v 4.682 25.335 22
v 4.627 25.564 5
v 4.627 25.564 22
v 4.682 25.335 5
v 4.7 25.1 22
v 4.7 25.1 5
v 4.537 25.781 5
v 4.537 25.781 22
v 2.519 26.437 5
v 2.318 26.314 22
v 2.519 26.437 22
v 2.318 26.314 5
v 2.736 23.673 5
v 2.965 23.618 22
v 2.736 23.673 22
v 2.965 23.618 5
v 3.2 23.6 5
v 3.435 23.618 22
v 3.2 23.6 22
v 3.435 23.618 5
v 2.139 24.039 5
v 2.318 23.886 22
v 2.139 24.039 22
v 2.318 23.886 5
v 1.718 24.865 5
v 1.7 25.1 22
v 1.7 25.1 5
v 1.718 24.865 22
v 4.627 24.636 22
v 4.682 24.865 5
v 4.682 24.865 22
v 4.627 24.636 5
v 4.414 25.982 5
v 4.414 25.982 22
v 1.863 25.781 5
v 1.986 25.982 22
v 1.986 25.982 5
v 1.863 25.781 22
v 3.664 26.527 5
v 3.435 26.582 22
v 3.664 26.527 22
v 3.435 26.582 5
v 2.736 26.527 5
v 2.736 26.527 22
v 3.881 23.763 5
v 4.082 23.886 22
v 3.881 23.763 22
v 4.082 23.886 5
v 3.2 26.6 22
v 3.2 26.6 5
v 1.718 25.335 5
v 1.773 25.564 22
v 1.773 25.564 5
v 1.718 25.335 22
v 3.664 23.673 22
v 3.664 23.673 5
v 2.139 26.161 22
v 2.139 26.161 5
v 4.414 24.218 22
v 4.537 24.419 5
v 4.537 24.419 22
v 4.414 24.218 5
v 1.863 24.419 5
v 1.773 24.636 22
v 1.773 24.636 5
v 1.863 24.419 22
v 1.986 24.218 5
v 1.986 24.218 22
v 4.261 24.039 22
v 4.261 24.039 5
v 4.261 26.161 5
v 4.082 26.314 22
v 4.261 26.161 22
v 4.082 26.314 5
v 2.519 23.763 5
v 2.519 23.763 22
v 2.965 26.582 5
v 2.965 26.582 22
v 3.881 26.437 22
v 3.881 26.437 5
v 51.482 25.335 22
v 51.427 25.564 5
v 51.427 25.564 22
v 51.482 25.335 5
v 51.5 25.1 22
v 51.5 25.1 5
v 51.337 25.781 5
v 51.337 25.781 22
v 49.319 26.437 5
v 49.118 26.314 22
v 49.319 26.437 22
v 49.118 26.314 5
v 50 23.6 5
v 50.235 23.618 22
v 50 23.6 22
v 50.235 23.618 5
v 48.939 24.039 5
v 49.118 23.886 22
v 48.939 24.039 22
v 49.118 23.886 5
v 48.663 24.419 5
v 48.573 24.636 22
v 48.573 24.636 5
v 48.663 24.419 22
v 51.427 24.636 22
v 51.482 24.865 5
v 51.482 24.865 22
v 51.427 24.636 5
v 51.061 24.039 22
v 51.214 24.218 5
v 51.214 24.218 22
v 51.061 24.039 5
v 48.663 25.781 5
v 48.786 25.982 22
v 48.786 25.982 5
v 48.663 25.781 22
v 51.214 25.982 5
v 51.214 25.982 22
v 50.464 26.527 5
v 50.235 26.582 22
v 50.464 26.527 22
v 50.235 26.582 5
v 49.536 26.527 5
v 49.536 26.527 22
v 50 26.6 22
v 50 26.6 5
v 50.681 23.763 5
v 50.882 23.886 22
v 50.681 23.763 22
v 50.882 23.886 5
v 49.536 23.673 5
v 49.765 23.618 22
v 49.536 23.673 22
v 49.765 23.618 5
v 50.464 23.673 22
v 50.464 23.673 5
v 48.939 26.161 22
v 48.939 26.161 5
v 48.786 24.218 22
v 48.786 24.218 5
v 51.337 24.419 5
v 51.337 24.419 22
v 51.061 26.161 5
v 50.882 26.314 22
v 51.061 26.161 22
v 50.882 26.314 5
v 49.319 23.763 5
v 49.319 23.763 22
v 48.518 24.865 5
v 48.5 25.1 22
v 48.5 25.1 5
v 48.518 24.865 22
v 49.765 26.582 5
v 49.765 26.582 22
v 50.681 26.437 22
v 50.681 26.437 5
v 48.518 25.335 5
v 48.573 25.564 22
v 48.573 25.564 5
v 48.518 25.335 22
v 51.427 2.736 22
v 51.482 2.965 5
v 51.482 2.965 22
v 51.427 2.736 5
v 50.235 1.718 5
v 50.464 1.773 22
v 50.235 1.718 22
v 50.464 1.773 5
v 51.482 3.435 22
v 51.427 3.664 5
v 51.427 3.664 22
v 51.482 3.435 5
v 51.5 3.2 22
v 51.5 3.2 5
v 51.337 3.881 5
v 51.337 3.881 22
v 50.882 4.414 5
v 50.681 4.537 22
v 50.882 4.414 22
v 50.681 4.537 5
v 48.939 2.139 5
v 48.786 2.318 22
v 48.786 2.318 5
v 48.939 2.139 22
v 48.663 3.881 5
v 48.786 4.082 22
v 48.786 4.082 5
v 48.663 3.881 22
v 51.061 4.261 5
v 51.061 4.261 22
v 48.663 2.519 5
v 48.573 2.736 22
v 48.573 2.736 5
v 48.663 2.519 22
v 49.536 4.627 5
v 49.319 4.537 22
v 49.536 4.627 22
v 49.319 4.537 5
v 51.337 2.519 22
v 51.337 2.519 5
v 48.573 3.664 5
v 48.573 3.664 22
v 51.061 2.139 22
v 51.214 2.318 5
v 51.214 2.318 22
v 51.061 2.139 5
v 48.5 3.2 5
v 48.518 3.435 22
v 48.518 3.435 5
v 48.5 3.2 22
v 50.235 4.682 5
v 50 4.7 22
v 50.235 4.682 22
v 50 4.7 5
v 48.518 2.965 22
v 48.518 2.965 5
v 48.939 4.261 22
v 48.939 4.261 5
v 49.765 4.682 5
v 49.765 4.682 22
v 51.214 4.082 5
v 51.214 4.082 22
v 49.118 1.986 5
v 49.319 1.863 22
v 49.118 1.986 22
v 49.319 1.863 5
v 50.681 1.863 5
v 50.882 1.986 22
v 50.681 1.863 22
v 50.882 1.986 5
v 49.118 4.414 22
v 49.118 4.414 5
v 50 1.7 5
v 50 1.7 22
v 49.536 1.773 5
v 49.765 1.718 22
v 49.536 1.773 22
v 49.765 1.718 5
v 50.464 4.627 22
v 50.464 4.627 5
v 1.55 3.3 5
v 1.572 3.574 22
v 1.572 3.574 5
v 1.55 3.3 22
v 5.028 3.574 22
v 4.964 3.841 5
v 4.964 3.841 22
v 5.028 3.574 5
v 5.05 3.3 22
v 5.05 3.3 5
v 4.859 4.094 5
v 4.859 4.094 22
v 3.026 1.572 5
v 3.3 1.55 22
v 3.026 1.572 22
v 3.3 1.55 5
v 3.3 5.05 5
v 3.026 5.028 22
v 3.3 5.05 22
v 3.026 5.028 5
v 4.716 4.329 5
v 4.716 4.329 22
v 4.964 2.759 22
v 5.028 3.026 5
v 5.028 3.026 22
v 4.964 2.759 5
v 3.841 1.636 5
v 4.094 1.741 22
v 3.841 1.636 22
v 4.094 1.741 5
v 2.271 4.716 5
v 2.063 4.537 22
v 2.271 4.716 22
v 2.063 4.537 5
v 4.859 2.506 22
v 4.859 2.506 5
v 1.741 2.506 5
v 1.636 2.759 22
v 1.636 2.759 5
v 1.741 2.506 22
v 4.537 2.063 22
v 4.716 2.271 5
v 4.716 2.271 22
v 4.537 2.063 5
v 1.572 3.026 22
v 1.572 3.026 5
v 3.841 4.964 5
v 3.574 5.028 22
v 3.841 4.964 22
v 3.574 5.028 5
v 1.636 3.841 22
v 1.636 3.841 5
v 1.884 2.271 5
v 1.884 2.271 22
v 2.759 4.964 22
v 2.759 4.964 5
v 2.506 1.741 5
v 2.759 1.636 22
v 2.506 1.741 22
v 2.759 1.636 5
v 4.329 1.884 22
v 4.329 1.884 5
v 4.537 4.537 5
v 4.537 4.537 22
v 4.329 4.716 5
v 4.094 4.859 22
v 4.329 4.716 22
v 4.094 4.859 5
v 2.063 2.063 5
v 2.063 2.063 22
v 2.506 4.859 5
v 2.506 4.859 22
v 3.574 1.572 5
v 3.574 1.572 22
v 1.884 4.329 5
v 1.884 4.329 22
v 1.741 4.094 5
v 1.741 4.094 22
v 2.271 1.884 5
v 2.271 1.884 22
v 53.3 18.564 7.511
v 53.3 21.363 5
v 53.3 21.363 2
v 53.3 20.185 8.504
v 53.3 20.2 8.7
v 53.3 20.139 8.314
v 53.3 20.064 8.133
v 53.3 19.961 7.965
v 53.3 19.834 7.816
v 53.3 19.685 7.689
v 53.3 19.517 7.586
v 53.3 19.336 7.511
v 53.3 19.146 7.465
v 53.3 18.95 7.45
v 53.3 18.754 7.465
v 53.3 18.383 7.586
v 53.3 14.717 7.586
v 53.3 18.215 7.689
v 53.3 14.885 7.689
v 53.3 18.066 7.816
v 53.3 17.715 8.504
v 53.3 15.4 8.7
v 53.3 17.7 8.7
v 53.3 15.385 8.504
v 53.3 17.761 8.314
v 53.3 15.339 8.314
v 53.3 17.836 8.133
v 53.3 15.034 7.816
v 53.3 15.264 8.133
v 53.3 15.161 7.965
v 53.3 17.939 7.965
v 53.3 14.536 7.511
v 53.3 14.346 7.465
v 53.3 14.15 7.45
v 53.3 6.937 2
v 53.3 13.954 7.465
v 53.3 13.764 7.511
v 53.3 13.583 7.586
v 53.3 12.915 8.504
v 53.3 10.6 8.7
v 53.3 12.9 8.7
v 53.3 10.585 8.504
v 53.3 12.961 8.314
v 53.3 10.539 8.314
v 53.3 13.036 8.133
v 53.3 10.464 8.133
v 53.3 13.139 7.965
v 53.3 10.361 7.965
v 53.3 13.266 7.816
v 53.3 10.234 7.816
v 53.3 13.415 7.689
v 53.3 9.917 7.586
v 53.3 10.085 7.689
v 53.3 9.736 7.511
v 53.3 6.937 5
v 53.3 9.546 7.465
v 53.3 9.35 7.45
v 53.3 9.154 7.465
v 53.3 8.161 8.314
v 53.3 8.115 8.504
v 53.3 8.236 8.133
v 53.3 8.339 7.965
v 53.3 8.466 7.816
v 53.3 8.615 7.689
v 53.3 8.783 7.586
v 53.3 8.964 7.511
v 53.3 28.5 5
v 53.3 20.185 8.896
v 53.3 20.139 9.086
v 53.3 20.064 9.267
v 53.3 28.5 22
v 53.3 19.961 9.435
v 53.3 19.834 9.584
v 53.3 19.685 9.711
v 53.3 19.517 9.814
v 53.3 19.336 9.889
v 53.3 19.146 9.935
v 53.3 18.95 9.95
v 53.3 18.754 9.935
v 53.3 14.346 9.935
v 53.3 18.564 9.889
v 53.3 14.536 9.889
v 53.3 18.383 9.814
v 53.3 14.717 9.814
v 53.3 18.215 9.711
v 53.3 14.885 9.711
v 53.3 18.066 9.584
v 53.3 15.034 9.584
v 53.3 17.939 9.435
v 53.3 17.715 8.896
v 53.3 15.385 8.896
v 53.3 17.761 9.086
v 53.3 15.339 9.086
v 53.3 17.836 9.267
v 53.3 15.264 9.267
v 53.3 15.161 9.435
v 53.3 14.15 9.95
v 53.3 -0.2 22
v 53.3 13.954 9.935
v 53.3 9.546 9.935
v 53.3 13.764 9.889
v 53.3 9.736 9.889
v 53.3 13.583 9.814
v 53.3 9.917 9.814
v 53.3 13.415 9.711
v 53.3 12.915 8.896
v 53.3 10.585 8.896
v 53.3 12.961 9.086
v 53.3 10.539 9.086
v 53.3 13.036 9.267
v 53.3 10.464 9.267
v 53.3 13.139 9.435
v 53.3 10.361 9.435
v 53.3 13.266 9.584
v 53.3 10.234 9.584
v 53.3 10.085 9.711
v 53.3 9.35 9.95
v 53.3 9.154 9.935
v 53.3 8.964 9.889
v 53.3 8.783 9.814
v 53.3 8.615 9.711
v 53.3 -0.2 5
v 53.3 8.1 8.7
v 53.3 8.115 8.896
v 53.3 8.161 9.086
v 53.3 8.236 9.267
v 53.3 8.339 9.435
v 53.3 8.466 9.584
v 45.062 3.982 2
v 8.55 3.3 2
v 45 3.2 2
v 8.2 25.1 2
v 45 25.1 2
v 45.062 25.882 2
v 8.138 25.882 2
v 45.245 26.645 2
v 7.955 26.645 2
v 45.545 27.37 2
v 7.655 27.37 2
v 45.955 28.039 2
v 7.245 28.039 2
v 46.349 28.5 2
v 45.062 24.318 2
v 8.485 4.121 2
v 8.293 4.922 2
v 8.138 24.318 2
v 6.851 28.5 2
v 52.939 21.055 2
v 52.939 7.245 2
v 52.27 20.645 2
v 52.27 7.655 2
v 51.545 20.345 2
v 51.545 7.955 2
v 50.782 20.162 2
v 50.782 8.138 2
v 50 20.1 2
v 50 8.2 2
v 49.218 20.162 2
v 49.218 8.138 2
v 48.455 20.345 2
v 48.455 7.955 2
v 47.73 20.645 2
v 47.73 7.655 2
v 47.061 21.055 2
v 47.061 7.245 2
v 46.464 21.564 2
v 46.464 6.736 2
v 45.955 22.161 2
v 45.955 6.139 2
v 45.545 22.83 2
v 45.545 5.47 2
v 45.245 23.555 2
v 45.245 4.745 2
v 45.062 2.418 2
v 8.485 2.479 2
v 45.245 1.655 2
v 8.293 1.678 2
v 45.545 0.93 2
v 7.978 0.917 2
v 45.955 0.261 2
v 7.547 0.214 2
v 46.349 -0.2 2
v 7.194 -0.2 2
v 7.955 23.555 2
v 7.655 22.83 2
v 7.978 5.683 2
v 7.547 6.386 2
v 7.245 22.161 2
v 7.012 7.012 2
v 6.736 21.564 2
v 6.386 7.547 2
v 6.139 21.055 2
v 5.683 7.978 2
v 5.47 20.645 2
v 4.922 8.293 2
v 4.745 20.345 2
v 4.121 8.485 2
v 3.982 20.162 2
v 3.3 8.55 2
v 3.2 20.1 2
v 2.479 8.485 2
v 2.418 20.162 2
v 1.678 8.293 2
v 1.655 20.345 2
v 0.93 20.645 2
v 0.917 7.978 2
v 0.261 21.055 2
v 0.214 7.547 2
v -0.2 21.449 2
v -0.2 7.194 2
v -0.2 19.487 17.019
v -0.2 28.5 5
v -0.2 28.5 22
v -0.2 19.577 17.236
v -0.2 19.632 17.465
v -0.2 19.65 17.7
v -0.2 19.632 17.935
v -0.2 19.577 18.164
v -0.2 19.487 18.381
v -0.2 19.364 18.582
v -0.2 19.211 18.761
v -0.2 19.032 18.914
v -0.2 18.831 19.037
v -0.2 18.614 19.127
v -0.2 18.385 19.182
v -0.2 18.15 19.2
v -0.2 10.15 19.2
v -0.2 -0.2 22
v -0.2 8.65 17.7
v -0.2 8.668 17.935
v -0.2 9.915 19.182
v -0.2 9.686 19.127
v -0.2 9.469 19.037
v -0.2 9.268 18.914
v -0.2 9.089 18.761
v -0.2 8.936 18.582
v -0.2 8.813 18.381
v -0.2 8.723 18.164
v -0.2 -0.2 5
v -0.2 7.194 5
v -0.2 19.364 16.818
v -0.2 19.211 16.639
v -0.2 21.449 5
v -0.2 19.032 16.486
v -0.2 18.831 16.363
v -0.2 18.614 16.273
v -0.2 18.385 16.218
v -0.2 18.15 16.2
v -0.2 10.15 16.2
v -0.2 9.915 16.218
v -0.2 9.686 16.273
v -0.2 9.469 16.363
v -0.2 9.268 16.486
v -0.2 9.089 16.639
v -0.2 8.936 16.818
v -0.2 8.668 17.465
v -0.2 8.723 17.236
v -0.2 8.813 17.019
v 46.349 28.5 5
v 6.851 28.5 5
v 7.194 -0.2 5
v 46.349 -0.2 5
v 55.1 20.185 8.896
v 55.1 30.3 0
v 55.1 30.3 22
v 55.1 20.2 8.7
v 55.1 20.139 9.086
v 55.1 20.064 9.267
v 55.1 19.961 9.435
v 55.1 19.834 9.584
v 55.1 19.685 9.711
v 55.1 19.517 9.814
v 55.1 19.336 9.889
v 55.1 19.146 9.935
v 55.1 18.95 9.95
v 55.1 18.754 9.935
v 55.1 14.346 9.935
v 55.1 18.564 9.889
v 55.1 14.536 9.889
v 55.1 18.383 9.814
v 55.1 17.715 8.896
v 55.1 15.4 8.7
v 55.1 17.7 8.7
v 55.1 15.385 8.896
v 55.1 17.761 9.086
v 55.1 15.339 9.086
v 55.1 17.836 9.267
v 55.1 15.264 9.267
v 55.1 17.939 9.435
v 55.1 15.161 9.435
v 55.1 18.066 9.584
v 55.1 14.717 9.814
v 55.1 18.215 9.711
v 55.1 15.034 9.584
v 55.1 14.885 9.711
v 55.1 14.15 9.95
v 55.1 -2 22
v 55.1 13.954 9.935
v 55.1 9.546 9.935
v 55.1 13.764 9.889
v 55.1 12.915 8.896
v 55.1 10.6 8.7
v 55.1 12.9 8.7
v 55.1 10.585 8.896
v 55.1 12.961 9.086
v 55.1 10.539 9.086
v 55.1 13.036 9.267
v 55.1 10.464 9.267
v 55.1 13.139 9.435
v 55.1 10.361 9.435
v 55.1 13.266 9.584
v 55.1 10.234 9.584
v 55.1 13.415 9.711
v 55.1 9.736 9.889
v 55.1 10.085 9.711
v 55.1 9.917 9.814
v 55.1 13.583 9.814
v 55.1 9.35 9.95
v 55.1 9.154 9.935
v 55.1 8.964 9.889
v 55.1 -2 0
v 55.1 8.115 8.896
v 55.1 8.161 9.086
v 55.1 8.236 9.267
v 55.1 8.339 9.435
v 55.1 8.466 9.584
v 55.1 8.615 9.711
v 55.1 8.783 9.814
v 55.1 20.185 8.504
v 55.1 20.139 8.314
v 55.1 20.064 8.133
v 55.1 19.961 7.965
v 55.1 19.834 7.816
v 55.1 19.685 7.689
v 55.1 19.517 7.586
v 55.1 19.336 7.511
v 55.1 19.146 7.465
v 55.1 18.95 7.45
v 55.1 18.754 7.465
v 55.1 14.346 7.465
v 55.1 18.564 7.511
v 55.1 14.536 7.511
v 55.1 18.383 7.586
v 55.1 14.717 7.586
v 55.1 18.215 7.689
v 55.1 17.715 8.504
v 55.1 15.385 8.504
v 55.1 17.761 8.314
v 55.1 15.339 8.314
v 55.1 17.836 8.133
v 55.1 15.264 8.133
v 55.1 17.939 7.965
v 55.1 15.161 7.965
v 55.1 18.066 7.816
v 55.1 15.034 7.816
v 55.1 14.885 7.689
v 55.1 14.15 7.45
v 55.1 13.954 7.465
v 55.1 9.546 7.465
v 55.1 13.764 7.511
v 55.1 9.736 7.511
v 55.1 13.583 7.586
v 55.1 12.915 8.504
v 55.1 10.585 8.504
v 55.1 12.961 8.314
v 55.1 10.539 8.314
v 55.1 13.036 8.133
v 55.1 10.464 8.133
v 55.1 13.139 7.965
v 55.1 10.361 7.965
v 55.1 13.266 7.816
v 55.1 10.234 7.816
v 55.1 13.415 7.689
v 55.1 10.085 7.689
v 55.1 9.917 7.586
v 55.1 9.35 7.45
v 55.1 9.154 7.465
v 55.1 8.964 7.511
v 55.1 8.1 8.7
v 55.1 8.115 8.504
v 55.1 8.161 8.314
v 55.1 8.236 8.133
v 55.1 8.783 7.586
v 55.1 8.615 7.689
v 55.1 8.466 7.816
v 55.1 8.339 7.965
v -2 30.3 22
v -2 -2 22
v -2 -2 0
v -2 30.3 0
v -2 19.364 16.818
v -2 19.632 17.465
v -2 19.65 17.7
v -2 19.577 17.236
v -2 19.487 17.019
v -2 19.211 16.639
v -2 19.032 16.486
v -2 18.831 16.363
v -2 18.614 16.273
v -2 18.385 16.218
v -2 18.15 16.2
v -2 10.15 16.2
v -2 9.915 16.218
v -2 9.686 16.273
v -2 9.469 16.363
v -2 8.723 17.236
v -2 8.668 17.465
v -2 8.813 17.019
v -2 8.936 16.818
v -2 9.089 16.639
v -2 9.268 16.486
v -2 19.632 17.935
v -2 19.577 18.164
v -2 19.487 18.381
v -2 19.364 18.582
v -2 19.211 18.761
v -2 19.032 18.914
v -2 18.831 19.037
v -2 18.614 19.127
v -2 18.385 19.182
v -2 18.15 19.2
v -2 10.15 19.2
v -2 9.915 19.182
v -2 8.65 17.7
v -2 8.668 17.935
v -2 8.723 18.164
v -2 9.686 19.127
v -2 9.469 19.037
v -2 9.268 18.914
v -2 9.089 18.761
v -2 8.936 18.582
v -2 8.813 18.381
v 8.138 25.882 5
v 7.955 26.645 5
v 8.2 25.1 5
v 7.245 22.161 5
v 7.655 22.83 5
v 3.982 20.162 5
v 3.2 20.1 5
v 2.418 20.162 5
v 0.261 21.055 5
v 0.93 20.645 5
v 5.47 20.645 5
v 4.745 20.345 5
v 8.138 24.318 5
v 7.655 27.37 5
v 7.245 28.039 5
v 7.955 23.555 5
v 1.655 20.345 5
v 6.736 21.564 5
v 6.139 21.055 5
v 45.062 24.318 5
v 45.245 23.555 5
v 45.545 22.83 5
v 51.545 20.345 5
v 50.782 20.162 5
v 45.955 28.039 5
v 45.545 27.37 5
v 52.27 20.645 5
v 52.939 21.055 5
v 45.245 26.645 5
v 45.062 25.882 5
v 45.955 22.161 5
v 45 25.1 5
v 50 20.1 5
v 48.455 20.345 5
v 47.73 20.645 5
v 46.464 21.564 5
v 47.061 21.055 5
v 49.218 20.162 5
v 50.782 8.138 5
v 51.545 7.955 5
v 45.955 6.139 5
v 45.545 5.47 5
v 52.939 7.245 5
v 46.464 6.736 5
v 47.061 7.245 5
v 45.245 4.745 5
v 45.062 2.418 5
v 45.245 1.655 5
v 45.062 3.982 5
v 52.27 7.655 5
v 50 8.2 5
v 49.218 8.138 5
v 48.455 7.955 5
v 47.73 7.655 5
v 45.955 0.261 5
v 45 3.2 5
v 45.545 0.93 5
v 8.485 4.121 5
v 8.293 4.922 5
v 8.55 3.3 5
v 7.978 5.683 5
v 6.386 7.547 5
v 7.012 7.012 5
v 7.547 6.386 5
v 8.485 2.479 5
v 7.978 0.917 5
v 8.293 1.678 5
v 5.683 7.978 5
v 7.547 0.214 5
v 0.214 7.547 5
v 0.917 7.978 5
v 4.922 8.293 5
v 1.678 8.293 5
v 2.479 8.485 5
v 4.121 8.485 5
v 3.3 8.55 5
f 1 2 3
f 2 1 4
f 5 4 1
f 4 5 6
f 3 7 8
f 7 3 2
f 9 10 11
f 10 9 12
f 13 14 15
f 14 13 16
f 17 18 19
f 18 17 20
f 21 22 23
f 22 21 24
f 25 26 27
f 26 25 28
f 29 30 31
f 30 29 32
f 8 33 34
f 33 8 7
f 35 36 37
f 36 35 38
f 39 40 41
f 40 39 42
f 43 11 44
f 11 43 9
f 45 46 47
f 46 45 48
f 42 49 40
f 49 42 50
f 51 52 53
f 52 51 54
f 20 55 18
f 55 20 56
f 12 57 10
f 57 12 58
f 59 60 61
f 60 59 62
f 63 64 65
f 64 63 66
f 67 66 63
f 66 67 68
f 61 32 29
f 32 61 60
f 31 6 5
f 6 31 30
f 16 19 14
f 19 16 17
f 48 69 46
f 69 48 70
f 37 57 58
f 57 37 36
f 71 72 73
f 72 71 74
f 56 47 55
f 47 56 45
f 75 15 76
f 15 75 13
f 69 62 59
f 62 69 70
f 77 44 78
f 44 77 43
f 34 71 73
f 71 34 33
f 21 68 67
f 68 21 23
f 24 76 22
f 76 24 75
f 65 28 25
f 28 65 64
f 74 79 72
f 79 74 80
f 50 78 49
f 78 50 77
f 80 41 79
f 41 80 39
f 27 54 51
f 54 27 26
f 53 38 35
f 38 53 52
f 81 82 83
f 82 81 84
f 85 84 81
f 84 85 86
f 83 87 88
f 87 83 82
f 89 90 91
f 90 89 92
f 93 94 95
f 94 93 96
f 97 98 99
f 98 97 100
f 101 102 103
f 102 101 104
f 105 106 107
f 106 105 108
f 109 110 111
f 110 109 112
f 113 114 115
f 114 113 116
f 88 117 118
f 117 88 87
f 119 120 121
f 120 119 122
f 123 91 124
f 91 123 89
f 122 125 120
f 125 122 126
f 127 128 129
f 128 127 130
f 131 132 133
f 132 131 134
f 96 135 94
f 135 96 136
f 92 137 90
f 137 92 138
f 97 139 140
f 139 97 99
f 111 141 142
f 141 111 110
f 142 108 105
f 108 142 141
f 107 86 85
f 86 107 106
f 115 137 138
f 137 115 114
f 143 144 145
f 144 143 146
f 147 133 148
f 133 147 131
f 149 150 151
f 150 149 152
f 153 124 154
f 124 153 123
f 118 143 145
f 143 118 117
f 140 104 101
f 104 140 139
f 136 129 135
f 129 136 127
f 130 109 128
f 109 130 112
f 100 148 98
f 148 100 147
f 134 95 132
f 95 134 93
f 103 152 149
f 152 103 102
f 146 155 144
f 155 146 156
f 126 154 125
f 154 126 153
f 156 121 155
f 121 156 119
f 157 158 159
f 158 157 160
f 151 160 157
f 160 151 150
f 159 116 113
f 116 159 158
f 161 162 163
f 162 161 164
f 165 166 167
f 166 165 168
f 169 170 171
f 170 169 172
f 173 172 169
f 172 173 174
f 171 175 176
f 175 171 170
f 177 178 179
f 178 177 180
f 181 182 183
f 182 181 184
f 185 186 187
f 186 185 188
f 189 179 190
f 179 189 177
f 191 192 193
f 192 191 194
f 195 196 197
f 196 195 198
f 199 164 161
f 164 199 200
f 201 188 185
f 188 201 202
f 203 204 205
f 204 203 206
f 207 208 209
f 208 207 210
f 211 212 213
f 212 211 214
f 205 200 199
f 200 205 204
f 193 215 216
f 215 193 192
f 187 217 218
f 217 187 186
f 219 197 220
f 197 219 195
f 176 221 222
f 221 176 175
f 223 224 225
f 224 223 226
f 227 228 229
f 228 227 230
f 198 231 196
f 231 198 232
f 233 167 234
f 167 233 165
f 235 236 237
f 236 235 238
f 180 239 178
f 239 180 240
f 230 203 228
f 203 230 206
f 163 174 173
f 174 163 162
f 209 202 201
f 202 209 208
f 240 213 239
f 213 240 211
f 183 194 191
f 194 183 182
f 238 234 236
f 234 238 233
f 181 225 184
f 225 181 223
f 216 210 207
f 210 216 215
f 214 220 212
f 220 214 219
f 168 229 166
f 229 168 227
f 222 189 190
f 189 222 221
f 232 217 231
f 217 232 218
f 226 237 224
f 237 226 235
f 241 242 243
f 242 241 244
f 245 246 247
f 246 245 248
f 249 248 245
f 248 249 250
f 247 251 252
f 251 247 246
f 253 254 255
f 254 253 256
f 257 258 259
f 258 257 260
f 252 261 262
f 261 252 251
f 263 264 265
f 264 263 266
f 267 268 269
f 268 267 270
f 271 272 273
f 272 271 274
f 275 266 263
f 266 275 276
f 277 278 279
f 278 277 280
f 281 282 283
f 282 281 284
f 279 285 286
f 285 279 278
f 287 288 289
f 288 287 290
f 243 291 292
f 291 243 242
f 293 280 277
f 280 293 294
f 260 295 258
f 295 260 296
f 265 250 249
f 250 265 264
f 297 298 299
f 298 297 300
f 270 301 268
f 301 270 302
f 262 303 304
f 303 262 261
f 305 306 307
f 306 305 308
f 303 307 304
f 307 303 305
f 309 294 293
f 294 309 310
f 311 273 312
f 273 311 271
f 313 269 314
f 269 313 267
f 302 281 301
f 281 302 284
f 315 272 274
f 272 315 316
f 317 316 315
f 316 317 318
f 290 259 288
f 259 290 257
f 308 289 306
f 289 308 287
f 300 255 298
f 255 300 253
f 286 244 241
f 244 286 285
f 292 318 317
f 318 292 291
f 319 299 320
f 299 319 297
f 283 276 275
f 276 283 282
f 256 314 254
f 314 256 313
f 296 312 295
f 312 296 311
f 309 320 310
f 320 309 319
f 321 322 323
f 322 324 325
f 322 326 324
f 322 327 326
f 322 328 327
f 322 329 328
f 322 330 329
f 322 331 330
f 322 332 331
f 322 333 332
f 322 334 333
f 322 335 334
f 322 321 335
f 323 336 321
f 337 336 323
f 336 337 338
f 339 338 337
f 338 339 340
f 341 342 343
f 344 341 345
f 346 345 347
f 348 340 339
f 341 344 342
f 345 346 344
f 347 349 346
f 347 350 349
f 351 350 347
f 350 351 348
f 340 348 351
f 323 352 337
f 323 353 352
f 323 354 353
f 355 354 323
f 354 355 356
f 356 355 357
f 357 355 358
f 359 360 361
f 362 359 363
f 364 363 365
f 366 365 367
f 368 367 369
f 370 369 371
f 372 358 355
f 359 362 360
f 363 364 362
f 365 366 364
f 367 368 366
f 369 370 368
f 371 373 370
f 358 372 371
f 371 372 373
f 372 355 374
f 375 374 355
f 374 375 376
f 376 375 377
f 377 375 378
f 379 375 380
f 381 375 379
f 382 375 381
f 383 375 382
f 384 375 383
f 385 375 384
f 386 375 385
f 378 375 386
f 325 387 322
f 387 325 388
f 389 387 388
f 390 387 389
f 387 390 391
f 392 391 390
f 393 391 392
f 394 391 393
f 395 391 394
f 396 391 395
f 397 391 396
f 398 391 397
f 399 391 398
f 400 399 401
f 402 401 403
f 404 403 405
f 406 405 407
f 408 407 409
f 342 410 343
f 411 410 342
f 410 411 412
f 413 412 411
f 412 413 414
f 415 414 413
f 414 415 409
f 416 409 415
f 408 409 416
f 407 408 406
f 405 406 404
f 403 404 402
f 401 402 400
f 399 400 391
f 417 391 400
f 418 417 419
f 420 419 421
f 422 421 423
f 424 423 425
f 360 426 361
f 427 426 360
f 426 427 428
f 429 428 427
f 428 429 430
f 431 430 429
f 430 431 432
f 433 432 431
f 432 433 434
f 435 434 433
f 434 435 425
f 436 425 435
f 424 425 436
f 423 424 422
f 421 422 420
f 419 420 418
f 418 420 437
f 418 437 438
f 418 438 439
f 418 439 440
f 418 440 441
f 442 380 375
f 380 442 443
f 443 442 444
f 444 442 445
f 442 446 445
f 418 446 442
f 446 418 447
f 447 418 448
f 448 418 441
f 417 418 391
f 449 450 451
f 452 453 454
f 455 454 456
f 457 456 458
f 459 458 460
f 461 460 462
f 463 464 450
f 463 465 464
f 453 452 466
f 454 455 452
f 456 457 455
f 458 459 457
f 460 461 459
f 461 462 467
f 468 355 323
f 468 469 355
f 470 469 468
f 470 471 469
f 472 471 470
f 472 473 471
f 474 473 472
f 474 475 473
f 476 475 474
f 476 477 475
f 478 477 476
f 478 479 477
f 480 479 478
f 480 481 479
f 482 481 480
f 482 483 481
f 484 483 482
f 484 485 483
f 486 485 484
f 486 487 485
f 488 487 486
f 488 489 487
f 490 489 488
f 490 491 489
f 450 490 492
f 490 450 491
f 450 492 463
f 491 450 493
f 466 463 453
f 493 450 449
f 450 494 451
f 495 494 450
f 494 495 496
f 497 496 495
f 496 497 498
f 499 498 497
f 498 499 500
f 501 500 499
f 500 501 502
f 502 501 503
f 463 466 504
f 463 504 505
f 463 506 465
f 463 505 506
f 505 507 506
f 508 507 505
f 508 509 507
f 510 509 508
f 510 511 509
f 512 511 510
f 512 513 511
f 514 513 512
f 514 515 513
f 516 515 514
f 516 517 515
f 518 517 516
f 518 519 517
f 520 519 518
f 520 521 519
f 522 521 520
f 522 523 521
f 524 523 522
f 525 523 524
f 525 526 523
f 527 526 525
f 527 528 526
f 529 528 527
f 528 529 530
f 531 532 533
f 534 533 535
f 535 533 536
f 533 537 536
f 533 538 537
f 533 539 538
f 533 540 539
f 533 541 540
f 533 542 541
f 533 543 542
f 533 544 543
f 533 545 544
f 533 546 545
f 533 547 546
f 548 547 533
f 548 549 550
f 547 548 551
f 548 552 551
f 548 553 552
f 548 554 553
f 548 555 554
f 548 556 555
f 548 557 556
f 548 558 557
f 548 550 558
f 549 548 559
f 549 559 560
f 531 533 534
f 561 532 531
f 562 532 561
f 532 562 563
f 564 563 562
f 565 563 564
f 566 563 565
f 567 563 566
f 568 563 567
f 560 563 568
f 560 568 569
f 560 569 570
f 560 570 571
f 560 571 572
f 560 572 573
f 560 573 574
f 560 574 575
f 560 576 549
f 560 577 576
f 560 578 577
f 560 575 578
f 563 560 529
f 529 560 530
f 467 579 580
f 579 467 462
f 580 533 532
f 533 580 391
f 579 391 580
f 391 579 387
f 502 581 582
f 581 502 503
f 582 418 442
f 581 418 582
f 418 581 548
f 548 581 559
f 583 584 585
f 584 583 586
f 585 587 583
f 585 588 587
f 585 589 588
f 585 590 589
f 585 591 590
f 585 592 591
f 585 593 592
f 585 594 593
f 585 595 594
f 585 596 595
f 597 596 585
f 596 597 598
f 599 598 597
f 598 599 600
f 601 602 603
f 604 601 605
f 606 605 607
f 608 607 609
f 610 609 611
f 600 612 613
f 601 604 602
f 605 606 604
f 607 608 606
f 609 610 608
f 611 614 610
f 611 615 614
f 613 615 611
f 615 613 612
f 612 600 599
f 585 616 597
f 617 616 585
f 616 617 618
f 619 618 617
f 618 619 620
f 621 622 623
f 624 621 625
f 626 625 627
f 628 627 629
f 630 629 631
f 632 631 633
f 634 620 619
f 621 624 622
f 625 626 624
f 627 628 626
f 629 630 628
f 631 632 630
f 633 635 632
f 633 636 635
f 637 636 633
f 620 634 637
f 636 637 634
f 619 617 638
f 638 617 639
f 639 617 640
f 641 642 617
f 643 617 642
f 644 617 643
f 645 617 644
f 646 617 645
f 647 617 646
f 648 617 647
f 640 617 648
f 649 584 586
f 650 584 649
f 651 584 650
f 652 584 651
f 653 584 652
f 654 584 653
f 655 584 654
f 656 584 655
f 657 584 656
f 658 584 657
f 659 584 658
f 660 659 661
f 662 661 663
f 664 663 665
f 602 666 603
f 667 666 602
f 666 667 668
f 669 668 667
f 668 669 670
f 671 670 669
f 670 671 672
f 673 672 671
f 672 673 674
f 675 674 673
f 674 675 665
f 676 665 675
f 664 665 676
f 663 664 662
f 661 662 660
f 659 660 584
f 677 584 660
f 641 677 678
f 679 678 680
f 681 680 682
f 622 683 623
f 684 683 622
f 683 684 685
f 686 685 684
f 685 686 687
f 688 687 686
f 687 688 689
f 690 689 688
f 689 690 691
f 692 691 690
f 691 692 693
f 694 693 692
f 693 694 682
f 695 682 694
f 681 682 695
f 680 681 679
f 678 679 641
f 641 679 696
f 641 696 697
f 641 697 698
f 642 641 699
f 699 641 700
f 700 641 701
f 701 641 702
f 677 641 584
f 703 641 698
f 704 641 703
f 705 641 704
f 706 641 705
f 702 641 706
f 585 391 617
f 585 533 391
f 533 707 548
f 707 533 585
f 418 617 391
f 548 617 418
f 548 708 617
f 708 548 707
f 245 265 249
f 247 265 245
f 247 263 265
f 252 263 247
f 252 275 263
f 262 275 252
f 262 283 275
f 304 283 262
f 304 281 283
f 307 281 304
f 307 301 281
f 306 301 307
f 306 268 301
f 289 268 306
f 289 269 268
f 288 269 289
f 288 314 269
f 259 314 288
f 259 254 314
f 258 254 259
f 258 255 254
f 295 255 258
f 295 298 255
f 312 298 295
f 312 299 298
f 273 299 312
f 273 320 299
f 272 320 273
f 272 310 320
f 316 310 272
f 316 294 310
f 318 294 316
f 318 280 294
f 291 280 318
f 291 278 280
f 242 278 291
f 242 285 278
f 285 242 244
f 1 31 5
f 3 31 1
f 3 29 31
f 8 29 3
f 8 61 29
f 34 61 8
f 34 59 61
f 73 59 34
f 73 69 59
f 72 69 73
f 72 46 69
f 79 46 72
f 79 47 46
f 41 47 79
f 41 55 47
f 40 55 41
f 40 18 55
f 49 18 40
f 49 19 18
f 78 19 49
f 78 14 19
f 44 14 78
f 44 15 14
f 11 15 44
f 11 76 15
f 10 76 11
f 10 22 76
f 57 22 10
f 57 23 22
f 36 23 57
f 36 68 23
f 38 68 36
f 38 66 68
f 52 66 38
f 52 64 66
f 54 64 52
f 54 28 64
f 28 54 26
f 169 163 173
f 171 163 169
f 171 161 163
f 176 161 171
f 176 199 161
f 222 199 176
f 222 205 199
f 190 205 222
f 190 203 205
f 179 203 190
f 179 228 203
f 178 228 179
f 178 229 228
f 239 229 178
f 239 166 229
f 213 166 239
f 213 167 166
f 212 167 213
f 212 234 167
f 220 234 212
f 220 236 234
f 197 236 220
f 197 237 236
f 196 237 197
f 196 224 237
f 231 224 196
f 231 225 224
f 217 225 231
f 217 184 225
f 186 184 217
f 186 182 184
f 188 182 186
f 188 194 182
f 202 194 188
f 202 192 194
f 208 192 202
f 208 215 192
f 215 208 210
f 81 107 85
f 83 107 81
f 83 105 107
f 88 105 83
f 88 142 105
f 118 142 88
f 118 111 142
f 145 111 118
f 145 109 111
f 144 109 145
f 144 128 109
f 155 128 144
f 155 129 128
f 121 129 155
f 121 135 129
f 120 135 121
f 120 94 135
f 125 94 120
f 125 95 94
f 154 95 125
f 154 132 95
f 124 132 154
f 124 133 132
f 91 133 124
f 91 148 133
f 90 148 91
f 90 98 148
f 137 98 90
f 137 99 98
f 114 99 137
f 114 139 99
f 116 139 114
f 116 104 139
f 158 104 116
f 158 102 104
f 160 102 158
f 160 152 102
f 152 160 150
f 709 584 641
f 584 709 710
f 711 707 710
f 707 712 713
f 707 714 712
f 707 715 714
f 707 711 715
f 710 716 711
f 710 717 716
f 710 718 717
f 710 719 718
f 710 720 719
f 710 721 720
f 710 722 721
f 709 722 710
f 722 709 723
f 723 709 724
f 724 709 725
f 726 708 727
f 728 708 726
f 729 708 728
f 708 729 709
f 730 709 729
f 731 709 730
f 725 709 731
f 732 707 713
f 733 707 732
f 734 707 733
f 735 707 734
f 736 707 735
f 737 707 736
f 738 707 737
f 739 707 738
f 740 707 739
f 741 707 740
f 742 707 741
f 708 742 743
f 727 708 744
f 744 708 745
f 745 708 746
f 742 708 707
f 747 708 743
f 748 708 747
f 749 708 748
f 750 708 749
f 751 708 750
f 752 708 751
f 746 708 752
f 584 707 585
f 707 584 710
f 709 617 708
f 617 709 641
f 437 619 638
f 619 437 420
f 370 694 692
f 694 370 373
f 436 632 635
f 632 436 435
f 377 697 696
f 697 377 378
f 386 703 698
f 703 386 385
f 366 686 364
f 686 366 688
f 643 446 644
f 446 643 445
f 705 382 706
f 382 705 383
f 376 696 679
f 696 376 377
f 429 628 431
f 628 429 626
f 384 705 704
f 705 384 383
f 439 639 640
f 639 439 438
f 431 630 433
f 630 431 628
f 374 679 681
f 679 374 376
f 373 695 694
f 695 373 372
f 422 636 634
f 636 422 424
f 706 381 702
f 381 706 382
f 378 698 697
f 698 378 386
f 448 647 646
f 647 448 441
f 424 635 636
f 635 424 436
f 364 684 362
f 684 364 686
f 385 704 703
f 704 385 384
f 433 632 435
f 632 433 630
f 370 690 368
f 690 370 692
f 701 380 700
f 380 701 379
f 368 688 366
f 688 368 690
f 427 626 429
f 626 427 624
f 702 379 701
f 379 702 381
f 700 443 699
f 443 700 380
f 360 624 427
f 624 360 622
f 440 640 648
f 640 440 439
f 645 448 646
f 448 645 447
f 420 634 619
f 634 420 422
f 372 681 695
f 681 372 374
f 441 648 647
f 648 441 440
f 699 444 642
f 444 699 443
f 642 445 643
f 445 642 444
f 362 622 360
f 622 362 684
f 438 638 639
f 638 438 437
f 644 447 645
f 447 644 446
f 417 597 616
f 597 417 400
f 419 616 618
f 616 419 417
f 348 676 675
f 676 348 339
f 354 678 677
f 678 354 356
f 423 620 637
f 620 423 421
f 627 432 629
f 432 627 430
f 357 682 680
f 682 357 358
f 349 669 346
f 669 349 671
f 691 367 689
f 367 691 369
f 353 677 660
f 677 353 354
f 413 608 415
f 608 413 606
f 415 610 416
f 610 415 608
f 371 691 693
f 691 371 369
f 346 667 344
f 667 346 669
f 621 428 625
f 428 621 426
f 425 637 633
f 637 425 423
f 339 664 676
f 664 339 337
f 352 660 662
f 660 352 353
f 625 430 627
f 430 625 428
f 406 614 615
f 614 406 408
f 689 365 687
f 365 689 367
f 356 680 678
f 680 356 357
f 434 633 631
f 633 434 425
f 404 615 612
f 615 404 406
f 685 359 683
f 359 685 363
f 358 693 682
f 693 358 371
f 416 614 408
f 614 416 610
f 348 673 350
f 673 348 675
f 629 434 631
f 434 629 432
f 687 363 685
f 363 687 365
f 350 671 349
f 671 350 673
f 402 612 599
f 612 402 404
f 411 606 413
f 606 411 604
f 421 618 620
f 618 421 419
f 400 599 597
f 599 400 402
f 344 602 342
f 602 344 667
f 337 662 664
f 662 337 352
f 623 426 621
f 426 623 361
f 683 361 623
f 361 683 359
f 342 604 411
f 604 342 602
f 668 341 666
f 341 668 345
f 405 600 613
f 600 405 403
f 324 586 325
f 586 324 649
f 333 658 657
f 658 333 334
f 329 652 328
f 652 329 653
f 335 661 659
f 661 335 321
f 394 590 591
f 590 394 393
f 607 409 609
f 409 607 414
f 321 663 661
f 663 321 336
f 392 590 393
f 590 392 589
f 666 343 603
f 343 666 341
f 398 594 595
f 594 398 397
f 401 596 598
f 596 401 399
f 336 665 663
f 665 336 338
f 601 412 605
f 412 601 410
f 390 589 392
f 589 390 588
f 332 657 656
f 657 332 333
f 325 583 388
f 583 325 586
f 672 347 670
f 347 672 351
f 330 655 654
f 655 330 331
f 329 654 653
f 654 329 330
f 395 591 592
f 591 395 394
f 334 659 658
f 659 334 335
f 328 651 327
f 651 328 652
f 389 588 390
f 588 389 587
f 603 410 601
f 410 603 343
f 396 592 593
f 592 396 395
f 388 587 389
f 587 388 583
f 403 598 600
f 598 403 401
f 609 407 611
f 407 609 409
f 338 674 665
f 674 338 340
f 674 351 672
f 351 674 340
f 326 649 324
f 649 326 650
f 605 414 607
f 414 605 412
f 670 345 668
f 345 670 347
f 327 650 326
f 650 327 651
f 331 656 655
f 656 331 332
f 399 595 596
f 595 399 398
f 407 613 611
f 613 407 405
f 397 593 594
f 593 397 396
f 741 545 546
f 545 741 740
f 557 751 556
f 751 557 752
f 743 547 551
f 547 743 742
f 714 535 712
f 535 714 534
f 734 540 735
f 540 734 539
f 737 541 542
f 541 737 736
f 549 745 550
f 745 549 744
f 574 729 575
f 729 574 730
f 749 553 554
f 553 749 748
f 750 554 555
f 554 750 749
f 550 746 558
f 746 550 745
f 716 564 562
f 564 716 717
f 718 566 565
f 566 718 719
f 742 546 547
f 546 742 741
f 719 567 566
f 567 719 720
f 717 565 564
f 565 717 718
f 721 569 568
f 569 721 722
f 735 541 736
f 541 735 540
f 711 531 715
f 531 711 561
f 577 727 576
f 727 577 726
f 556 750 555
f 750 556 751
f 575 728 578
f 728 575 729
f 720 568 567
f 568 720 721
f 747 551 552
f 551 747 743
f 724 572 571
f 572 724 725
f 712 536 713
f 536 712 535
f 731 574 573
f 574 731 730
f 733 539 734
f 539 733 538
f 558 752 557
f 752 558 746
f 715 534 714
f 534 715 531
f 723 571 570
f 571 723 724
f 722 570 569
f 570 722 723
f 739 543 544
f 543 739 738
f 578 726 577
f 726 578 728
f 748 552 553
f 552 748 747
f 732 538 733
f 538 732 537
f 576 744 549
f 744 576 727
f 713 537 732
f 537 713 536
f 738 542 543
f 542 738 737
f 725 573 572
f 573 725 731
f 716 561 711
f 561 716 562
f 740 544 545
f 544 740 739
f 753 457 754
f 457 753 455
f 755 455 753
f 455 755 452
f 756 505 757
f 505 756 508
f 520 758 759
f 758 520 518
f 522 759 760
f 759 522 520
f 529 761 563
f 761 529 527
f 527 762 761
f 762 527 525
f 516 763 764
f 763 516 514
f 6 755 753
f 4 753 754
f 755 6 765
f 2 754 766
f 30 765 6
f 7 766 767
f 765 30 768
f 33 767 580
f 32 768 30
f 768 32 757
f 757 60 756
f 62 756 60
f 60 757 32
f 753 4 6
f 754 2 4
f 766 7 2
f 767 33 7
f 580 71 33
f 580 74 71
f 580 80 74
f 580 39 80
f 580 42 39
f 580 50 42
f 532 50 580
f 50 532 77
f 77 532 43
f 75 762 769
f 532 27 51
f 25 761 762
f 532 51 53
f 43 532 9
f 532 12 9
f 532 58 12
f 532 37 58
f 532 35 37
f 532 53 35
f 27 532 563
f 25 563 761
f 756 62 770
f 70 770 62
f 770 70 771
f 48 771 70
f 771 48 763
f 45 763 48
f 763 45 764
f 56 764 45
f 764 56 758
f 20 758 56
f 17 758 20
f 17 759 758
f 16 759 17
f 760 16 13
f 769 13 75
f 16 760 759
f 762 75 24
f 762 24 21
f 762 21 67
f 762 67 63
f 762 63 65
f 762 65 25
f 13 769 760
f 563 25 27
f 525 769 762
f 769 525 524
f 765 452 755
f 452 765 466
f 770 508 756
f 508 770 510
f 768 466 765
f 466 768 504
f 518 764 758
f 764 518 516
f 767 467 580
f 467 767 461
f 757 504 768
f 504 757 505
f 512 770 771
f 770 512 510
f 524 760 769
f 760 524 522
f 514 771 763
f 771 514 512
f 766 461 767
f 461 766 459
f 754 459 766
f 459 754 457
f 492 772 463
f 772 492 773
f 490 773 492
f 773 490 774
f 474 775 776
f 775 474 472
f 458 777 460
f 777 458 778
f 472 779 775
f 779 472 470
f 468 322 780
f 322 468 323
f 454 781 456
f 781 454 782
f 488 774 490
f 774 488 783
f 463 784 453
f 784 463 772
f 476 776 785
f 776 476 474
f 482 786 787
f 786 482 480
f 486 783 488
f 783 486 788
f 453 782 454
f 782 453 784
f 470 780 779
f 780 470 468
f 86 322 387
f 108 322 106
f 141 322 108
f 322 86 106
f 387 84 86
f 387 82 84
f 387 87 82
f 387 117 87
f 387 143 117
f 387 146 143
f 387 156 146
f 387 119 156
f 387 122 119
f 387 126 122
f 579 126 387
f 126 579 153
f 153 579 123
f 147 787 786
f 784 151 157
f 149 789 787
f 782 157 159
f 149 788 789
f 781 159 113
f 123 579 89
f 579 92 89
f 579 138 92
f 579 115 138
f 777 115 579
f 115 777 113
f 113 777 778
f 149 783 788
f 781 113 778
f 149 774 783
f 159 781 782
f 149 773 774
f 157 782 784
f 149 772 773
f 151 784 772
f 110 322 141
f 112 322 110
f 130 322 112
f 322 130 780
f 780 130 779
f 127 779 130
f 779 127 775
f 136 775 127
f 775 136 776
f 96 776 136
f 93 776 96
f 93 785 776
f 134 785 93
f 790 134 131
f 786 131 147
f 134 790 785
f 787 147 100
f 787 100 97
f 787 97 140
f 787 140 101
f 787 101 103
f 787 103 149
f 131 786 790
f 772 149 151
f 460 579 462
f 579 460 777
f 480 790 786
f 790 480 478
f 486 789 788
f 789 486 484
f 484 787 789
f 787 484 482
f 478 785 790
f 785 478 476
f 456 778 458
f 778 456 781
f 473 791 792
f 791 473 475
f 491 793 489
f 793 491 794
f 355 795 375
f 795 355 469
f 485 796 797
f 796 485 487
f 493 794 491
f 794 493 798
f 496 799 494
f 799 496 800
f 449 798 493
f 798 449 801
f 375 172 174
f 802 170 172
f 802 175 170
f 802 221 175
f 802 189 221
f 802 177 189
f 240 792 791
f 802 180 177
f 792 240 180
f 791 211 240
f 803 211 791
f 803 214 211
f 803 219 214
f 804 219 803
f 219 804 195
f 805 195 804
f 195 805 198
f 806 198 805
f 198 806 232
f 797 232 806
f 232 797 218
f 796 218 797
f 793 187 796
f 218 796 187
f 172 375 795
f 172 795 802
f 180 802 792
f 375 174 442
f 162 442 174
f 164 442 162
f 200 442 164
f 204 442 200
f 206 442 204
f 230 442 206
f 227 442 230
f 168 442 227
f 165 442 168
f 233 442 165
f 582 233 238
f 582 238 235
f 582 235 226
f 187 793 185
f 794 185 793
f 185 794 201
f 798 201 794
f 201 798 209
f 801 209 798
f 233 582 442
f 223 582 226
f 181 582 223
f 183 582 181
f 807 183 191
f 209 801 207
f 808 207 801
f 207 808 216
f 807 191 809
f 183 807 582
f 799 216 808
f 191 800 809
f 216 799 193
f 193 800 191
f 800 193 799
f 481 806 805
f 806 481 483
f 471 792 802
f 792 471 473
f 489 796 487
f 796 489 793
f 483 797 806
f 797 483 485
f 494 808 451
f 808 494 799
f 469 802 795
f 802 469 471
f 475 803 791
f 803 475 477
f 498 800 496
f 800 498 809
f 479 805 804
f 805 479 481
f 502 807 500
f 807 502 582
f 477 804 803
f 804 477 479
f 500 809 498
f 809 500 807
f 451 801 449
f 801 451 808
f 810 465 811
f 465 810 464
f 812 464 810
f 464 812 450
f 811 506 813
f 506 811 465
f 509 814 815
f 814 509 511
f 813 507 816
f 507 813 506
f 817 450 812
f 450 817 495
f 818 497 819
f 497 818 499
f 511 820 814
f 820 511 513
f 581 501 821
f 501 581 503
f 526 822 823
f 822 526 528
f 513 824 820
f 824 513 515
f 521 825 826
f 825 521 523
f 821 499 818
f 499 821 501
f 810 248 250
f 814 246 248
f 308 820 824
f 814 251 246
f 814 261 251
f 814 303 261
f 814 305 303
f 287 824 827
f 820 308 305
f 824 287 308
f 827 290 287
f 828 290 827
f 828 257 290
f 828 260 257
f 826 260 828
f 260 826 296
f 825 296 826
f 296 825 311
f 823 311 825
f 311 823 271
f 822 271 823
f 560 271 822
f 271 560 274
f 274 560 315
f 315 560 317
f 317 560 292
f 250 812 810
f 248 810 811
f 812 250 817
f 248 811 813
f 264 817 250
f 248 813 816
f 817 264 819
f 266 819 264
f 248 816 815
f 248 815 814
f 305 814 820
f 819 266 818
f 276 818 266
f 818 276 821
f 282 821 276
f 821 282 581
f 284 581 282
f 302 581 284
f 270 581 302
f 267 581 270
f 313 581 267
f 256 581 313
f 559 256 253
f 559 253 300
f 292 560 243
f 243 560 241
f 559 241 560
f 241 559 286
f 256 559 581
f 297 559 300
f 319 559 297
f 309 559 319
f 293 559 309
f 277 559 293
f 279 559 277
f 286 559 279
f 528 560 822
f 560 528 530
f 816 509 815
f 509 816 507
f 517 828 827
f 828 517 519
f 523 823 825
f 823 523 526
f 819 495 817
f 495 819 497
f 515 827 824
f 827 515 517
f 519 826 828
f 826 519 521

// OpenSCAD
$shell = 2;

module relay_slab(shell=0) {
  translate([-shell,-shell,0]) cube([53.1+shell*2,28.3+shell*2,1]);
}

module relay_hole(d=3.8) {
  cylinder(h=10,r1=d/2,r2=d/2,center=true,$fn=40);
}

module relay_stand(d=3.8) {
  translate([0,0,0.5-0.05]) cylinder(h=1.1,r1=d/2,r2=d/2,center=true,$fn=40);
}

module relay_pegs(fudge) {
  translate([3.2,25.1,0]) relay_hole(3.4-fudge*2);
  translate([50,25.1,0]) relay_hole(3.4-fudge*2);
  translate([50,3.2,0]) relay_hole(3.4-fudge*2);
  translate([3.3,3.3,0]) relay_hole(3.9-fudge*2);
}

module relay_footprint(shell=0,fudge=0) {
  difference() {
    relay_slab(shell+fudge);
    relay_pegs(fudge);
  }
}

module wire_hole(y,d=2.5) {
  translate([53.1+$shell/2,y+28.3/2,6.7+$shell]) rotate([0,90,0])
    cylinder(h=$shell*2,r1=d/2,r2=d/2,center=true,$fn=40);
}

// scale([1,1,2]) relay_footprint();
// translate([0,32,0]) difference() {
//   scale([1,1,20+$shell]) relay_slab($shell);
//   translate([0,0,$shell]) scale([1,1,25]) relay_footprint();
// }
// translate([0,66,0])
module relay_box() {
  color([0.7,0.7,0.7]) union() {
    difference() {
      scale([1,1,20+$shell]) relay_slab($shell);
      translate([0,0,$shell]) scale([1,1,25]) relay_footprint(0,0.2);
      wire_hole(-4.8);
      wire_hole(0);
      wire_hole(4.8);
      translate([-53.1-$shell,0,9]) hull() {
        wire_hole(-4,3);
        wire_hole(4,3);
      }
    }
    translate([0,0,$shell]) {
      scale([1,1,3]) {
        translate([3.2,25.1,0]) relay_stand(10);
        translate([50,25.1,0]) relay_stand(10);
        translate([50,3.2,0]) relay_stand(10);
        translate([3.3,3.3,0]) relay_stand(10.5);
      }
    }
  }
}

module relay_lid() {
  // translate([0,60,0])
  rotate([180,0,0]) {
    union() {
      intersection() {
        scale([1,1,25]) {
          difference() {
            relay_pegs(-1);
            scale([1,1,2]) relay_pegs(0.3);
          }
        }
        translate([0,0,3+$shell+1.4]) scale([1,1,20-3-1.4]) relay_slab();
      }
      translate([0,0,20+$shell]) scale([1,1,2]) relay_slab($shell);
    }
  }
}

relay_box();
*relay_lid();

// translate([0,40,0]) difference() {
//   translate([0,0,3+$shell+1.4]) scale([1,1,20-3-1.4]) #relay_slab();
//   relay_box();
// }
